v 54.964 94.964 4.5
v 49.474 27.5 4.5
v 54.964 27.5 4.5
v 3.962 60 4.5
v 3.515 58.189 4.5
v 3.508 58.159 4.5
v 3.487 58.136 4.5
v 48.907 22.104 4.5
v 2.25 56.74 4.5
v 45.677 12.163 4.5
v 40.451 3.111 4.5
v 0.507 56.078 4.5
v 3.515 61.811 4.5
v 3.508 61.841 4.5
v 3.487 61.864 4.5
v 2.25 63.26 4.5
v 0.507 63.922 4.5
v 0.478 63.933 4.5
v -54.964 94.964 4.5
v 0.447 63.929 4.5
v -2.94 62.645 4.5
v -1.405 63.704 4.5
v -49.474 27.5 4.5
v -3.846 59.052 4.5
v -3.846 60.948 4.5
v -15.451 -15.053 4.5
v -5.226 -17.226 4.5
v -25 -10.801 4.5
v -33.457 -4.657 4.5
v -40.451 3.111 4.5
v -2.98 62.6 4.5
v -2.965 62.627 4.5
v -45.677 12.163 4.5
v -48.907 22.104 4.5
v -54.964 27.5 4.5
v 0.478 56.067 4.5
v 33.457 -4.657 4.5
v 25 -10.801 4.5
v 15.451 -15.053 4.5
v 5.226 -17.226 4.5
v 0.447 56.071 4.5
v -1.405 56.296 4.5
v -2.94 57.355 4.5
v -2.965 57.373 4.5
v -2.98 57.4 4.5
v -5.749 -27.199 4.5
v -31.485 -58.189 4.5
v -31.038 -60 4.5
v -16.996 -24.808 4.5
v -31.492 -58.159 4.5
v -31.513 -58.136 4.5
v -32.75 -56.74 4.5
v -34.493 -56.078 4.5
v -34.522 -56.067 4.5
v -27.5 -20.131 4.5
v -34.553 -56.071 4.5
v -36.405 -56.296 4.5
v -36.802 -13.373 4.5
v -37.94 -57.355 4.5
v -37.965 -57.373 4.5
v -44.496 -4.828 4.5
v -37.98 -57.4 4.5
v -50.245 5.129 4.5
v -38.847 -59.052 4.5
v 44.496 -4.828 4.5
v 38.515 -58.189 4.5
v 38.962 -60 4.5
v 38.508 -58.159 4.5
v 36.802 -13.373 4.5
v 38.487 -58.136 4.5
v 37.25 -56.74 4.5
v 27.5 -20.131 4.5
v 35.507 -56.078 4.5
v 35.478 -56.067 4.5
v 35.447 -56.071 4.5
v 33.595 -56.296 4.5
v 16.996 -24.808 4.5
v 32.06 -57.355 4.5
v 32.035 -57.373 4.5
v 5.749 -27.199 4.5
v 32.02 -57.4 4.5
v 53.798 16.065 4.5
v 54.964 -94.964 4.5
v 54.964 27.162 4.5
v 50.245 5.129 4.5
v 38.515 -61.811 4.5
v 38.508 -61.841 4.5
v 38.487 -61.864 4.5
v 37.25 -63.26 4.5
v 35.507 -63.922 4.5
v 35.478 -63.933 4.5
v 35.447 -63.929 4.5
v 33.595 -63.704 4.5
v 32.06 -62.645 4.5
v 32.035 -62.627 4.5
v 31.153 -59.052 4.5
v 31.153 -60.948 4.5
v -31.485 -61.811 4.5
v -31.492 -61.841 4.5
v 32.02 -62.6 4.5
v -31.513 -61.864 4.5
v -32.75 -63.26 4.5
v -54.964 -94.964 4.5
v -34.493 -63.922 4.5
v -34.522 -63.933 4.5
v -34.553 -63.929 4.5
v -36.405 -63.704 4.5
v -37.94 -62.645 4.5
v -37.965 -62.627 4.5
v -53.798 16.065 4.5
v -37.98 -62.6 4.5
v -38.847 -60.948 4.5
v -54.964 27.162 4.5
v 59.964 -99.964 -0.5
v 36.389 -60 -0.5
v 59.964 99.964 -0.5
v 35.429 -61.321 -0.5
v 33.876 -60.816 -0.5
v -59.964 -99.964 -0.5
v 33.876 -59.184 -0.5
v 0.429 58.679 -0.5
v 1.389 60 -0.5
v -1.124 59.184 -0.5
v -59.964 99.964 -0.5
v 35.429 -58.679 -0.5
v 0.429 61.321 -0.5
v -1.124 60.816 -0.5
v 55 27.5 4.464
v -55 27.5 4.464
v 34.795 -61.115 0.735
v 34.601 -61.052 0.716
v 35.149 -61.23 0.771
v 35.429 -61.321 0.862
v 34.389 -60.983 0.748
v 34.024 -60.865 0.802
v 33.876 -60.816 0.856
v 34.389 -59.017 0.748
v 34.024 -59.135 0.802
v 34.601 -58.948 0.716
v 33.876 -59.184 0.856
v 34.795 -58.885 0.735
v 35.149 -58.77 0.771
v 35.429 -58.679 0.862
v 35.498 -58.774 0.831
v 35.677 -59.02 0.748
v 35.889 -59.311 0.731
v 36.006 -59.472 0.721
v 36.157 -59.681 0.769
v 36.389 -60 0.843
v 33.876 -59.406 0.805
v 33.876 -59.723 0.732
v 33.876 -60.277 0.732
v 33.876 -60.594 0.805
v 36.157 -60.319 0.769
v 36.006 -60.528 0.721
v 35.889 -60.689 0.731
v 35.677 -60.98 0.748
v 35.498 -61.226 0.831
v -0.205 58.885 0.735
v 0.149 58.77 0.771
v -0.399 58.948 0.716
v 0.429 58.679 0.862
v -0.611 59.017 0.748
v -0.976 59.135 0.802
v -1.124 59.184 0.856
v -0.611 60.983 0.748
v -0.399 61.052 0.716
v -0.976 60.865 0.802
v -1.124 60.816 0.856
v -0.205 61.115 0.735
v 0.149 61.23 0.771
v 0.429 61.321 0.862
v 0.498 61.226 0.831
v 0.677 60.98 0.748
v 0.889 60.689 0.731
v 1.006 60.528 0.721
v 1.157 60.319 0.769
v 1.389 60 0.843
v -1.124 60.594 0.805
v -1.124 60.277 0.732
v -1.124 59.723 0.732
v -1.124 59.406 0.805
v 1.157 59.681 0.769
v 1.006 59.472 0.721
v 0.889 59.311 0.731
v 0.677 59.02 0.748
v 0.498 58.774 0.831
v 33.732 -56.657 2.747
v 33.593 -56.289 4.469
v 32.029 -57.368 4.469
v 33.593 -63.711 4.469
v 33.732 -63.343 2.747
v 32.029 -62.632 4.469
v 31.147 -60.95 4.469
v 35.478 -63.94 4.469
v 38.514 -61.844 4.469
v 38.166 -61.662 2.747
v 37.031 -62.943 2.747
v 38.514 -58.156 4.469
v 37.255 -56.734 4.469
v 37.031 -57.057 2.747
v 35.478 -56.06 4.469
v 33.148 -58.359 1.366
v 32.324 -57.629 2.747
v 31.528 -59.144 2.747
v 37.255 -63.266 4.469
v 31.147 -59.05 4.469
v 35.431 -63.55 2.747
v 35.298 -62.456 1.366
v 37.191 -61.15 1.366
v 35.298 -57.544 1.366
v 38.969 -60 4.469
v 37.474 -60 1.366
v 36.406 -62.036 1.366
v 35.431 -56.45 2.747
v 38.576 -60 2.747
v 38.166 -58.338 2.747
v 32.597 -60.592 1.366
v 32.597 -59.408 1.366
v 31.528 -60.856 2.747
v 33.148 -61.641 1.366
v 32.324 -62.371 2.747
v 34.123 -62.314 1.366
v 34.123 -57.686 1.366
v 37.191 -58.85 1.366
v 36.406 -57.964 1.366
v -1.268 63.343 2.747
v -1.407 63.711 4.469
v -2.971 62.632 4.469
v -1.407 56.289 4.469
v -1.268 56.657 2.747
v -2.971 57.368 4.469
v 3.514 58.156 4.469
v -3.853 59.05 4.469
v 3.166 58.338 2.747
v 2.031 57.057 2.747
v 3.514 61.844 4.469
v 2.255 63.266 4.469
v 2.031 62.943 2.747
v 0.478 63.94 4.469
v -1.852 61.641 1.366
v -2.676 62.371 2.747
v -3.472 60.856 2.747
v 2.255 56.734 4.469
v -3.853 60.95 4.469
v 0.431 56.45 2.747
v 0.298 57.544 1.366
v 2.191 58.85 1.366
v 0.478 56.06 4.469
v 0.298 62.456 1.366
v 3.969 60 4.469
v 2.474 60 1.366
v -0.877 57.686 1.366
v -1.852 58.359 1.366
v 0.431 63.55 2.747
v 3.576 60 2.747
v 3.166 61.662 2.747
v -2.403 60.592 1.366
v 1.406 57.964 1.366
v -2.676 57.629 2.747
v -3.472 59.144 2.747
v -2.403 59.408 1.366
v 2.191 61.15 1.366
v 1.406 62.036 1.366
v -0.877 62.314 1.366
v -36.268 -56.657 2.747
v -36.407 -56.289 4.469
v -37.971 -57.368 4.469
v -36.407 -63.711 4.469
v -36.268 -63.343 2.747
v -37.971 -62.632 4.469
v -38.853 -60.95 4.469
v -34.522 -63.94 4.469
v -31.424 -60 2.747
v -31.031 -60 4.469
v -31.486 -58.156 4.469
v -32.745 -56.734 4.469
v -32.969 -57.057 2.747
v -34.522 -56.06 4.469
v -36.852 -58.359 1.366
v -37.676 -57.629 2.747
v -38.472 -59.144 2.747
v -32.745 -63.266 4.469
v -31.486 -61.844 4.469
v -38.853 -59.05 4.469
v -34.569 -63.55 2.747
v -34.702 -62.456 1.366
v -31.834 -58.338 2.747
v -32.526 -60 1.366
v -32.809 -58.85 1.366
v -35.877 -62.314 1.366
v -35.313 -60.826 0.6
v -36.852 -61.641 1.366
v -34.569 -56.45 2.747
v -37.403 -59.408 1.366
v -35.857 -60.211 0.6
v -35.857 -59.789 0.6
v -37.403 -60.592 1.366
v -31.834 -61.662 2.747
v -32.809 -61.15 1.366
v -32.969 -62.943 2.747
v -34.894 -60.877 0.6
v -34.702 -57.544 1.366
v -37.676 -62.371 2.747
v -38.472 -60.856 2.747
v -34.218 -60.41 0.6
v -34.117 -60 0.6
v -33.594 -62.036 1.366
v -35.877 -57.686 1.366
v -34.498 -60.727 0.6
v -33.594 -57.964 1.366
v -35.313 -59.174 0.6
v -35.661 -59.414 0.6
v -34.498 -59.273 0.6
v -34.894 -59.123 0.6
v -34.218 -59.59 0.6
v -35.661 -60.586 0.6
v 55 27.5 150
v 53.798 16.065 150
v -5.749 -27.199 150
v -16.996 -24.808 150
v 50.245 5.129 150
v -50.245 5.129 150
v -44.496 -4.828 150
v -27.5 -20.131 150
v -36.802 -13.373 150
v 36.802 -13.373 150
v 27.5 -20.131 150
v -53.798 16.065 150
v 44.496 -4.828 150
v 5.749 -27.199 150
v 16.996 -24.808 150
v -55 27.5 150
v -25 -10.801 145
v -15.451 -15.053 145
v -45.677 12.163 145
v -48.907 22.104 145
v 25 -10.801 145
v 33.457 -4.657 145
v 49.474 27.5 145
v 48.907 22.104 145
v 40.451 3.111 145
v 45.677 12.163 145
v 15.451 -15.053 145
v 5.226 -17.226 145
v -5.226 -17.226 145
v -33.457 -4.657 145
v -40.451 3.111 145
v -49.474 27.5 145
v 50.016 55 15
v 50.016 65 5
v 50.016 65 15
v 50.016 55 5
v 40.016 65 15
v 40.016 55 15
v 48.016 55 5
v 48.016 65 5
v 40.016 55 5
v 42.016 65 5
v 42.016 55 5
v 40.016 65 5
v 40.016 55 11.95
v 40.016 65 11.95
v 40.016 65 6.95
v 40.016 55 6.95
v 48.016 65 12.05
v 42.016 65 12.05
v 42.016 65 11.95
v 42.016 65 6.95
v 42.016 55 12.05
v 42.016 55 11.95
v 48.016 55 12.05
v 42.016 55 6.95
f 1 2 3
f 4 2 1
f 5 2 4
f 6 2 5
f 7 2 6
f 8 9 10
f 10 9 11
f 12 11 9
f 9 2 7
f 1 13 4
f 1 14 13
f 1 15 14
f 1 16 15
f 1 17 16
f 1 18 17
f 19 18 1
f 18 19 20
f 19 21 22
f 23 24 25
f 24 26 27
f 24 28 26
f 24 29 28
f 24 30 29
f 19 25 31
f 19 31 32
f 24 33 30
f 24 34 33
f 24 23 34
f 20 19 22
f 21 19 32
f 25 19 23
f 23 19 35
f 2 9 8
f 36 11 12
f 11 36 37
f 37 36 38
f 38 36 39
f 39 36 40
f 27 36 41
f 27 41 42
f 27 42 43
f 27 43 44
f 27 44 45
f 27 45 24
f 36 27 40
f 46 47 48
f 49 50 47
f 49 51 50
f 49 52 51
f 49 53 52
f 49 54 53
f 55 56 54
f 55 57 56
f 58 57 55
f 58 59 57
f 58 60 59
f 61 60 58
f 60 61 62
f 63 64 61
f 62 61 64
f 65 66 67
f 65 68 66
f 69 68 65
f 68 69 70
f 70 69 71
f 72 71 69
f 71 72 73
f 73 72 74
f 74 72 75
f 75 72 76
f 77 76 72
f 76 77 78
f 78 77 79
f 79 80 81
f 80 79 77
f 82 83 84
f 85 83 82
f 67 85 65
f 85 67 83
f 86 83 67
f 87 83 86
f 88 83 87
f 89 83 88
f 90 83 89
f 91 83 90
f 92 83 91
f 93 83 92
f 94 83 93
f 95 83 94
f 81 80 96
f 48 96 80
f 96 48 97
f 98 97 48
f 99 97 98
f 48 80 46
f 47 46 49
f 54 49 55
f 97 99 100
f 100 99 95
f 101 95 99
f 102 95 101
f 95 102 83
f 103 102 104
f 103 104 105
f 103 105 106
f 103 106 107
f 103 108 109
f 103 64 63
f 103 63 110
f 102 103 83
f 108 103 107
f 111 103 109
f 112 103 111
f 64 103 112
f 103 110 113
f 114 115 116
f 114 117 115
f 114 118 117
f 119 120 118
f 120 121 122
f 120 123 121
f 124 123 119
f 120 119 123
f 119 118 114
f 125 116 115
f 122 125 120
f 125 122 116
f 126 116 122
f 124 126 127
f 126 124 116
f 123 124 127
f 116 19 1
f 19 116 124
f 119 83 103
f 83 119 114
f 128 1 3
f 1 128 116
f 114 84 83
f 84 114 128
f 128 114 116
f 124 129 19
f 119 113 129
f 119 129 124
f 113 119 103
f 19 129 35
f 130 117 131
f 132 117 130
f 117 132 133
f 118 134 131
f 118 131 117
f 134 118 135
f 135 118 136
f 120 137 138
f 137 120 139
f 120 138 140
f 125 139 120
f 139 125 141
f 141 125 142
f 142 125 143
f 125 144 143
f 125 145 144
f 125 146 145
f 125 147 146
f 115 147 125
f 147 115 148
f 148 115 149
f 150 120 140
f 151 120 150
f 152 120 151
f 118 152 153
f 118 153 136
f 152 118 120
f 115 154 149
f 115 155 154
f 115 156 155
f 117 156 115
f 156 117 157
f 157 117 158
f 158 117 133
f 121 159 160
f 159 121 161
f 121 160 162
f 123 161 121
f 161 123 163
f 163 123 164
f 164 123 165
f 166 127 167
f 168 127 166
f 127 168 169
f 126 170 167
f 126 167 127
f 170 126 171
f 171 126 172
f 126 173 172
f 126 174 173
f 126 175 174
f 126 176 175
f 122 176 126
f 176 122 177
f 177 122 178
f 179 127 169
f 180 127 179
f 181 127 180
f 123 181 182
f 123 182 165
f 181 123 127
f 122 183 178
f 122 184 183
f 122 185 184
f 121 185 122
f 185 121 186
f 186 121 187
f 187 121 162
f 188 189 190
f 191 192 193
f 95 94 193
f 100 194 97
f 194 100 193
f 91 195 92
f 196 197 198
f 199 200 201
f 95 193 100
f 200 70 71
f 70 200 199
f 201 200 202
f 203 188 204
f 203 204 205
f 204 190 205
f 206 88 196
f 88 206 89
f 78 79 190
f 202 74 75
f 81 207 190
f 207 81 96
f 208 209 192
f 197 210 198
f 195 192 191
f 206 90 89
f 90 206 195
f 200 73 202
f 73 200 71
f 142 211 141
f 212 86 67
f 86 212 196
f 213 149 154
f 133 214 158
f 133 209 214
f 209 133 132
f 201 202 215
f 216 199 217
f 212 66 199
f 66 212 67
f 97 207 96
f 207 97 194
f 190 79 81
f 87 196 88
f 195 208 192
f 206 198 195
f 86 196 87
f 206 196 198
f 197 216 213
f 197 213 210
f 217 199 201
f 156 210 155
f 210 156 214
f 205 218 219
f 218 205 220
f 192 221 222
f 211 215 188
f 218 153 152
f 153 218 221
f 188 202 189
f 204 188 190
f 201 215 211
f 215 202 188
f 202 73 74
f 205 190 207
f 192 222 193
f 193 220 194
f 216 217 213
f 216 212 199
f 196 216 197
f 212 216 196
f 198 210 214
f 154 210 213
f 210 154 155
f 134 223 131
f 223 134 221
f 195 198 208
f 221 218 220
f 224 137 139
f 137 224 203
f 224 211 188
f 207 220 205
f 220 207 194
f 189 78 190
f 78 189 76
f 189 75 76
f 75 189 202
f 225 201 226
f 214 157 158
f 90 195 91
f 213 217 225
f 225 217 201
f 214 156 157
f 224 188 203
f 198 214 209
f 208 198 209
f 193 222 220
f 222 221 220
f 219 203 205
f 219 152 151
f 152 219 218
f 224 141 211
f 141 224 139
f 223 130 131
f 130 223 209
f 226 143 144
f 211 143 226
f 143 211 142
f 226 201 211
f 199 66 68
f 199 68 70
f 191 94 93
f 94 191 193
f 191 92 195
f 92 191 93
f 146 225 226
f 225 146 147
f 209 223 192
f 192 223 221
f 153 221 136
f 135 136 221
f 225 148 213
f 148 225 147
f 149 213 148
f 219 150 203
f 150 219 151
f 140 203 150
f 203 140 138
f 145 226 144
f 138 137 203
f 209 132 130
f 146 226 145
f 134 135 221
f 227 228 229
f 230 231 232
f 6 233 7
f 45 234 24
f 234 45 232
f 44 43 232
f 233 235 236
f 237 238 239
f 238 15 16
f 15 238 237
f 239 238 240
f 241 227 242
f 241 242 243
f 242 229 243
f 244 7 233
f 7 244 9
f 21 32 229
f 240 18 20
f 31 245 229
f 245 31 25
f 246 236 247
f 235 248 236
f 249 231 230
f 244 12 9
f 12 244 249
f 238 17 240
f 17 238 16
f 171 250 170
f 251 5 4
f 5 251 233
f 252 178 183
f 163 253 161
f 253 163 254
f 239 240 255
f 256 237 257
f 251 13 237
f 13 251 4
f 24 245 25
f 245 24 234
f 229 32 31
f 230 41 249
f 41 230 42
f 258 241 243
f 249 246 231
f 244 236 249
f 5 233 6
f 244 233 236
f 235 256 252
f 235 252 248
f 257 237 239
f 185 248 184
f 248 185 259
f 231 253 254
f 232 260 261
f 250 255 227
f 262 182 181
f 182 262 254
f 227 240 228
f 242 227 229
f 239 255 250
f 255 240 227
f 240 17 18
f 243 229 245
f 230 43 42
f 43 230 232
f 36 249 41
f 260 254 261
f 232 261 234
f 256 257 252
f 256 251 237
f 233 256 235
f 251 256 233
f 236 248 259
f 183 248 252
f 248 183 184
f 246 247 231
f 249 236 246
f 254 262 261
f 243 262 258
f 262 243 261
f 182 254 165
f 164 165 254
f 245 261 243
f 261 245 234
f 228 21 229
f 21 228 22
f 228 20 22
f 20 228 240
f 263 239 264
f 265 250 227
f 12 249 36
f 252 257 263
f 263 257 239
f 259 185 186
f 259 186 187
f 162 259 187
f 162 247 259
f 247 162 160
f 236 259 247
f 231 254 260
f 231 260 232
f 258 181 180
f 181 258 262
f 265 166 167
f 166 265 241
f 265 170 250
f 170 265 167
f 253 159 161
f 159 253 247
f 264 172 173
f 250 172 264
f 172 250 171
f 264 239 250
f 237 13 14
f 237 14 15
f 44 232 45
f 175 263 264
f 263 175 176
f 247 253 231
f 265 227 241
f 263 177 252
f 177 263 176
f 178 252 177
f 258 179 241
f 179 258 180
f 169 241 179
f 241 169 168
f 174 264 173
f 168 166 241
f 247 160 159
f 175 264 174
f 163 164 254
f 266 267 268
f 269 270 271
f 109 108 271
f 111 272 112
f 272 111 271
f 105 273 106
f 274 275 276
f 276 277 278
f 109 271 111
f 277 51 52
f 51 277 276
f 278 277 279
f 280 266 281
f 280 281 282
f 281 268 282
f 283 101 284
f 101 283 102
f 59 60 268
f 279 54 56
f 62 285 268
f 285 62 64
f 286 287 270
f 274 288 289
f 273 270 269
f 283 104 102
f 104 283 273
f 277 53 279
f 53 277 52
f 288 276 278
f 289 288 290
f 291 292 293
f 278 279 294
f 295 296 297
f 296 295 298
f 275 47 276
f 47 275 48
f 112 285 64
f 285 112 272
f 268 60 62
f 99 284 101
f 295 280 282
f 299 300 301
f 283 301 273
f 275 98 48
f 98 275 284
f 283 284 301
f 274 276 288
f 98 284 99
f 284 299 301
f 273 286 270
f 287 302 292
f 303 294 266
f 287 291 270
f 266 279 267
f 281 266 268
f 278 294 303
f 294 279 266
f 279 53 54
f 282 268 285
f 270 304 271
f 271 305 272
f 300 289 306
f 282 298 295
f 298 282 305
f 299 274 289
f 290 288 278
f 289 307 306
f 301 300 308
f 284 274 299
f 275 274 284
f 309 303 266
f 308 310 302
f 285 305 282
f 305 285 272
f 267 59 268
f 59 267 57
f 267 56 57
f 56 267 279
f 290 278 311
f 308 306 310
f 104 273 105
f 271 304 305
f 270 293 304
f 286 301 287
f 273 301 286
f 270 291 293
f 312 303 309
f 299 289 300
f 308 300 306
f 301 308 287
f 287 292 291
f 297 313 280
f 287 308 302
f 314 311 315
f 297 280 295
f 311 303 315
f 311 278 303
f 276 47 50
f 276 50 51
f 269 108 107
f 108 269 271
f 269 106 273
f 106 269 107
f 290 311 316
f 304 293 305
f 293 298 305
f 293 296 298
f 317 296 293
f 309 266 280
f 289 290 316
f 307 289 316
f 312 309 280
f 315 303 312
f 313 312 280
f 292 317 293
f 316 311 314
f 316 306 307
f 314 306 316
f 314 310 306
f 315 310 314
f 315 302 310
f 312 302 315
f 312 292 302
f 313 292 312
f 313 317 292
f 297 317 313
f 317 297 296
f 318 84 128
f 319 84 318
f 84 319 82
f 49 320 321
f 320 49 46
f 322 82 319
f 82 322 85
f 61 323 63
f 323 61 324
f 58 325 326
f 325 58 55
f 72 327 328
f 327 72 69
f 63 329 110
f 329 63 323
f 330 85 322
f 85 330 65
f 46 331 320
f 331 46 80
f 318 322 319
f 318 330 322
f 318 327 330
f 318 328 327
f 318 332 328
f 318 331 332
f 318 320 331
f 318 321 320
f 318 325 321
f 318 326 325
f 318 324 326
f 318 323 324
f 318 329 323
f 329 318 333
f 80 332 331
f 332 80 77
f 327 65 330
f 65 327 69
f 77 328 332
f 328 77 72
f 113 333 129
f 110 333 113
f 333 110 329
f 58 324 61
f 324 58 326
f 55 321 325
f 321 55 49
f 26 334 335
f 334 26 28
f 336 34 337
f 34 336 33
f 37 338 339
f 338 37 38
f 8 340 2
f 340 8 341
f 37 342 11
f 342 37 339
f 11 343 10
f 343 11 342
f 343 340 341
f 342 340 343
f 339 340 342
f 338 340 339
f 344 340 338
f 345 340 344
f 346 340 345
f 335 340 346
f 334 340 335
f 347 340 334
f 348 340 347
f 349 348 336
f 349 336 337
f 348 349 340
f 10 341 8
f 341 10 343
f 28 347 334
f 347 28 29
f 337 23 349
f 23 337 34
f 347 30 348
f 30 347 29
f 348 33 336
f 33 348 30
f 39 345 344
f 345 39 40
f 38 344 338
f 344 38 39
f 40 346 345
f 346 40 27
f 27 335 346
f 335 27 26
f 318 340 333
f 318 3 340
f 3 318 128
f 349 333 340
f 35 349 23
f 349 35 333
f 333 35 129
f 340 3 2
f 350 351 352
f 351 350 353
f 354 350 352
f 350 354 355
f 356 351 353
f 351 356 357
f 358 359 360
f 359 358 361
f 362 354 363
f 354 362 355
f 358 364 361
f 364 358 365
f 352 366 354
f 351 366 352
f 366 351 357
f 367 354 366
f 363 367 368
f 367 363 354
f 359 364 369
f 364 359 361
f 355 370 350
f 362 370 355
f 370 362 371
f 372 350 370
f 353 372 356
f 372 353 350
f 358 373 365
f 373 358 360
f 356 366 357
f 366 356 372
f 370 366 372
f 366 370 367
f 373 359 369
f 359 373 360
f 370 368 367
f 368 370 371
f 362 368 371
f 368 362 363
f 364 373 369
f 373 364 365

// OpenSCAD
//Headphone Stand
//By Matthew Croft
//v.5 January 20,2019

//This project is designed to be a wall mount for a pair of headphones

//parameters-------------------------------------------------
cm=10;
screwd=0.2778125; //7 wood screw (mm)
screwhd=0.79375;
//render-----------------------------------------------------
stand();

//modules----------------------------------------------------
module stand() {
//bottom
  difference(){
    translate([0,0,cm*0.2]) cube([cm*12,cm*20,cm*0.5], center=true);
//smoothing base
    translate([0,cm*12.8,-cm*2.5]) rotate([-45,0,0]) cube([cm*14,cm*10,cm*0.5], center=true); 
    translate([0,cm*-12.8,-cm*2.5]) rotate([45,0,0]) cube([cm*14,cm*10,cm*0.5], center=true); 
    translate([cm*7.3,0,-cm]) rotate([0,45,0]) cube([cm*5,cm*21,cm*0.5], center=true); 
    translate([cm*-7.3,0,-cm]) rotate([0,-45,0]) cube([cm*5,cm*21,cm*0.5], center=true); 
//Screw Holes
    translate([cm*14/4,-cm*12/2,-1])cylinder(h=cm*4,d=screwd*cm,center=true);
    translate([-cm*7,-cm*12/2,-1])cylinder(h=cm*4,d=screwd*cm,center=true);
    translate([0,cm*12/2,-1])cylinder(h=cm*4,d=screwd*cm,center=true);
//screw head
    translate([cm*14/4,-cm*12/2,0.5+screwhd*cm/2])sphere(d=screwhd*cm);
    translate([0,cm*12/2,0.5+screwhd*cm/2])sphere(d=screwhd*cm);
    translate([-cm*14/4,-cm*12/2,0.5+screwhd*cm/2])sphere(d=screwhd*cm);
}
//holder
  translate([0,cm*11/4,0]) {
    difference(){
        translate([0,0,cm*7.5])cylinder(h=cm*15,d=cm*11,center=true);
        translate([0,cm*.5,cm*7.5-cm])cylinder(h=cm*16,d=cm*10,center=true);
        translate([0,cm*7.5,cm*7+0.45*cm-cm])cube([cm*14,cm*15,cm*20], center=true);
}
}
//wire holder
difference(){    
    translate([cm*14/3.11,cm*12/2,cm*0.5*2]) cube([cm*1,cm*1,cm*1], center=true);
    translate([cm*14/3.11,cm*12/2,cm*0.5*1.51]) cube([cm*0.6,cm*1.5,cm*0.9], center=true);
    translate([cm*14/3.5,cm*12/2,cm*0.5*1.89]) cube([cm*0.6,cm*1.5,cm*0.5], center=true);
}
}
